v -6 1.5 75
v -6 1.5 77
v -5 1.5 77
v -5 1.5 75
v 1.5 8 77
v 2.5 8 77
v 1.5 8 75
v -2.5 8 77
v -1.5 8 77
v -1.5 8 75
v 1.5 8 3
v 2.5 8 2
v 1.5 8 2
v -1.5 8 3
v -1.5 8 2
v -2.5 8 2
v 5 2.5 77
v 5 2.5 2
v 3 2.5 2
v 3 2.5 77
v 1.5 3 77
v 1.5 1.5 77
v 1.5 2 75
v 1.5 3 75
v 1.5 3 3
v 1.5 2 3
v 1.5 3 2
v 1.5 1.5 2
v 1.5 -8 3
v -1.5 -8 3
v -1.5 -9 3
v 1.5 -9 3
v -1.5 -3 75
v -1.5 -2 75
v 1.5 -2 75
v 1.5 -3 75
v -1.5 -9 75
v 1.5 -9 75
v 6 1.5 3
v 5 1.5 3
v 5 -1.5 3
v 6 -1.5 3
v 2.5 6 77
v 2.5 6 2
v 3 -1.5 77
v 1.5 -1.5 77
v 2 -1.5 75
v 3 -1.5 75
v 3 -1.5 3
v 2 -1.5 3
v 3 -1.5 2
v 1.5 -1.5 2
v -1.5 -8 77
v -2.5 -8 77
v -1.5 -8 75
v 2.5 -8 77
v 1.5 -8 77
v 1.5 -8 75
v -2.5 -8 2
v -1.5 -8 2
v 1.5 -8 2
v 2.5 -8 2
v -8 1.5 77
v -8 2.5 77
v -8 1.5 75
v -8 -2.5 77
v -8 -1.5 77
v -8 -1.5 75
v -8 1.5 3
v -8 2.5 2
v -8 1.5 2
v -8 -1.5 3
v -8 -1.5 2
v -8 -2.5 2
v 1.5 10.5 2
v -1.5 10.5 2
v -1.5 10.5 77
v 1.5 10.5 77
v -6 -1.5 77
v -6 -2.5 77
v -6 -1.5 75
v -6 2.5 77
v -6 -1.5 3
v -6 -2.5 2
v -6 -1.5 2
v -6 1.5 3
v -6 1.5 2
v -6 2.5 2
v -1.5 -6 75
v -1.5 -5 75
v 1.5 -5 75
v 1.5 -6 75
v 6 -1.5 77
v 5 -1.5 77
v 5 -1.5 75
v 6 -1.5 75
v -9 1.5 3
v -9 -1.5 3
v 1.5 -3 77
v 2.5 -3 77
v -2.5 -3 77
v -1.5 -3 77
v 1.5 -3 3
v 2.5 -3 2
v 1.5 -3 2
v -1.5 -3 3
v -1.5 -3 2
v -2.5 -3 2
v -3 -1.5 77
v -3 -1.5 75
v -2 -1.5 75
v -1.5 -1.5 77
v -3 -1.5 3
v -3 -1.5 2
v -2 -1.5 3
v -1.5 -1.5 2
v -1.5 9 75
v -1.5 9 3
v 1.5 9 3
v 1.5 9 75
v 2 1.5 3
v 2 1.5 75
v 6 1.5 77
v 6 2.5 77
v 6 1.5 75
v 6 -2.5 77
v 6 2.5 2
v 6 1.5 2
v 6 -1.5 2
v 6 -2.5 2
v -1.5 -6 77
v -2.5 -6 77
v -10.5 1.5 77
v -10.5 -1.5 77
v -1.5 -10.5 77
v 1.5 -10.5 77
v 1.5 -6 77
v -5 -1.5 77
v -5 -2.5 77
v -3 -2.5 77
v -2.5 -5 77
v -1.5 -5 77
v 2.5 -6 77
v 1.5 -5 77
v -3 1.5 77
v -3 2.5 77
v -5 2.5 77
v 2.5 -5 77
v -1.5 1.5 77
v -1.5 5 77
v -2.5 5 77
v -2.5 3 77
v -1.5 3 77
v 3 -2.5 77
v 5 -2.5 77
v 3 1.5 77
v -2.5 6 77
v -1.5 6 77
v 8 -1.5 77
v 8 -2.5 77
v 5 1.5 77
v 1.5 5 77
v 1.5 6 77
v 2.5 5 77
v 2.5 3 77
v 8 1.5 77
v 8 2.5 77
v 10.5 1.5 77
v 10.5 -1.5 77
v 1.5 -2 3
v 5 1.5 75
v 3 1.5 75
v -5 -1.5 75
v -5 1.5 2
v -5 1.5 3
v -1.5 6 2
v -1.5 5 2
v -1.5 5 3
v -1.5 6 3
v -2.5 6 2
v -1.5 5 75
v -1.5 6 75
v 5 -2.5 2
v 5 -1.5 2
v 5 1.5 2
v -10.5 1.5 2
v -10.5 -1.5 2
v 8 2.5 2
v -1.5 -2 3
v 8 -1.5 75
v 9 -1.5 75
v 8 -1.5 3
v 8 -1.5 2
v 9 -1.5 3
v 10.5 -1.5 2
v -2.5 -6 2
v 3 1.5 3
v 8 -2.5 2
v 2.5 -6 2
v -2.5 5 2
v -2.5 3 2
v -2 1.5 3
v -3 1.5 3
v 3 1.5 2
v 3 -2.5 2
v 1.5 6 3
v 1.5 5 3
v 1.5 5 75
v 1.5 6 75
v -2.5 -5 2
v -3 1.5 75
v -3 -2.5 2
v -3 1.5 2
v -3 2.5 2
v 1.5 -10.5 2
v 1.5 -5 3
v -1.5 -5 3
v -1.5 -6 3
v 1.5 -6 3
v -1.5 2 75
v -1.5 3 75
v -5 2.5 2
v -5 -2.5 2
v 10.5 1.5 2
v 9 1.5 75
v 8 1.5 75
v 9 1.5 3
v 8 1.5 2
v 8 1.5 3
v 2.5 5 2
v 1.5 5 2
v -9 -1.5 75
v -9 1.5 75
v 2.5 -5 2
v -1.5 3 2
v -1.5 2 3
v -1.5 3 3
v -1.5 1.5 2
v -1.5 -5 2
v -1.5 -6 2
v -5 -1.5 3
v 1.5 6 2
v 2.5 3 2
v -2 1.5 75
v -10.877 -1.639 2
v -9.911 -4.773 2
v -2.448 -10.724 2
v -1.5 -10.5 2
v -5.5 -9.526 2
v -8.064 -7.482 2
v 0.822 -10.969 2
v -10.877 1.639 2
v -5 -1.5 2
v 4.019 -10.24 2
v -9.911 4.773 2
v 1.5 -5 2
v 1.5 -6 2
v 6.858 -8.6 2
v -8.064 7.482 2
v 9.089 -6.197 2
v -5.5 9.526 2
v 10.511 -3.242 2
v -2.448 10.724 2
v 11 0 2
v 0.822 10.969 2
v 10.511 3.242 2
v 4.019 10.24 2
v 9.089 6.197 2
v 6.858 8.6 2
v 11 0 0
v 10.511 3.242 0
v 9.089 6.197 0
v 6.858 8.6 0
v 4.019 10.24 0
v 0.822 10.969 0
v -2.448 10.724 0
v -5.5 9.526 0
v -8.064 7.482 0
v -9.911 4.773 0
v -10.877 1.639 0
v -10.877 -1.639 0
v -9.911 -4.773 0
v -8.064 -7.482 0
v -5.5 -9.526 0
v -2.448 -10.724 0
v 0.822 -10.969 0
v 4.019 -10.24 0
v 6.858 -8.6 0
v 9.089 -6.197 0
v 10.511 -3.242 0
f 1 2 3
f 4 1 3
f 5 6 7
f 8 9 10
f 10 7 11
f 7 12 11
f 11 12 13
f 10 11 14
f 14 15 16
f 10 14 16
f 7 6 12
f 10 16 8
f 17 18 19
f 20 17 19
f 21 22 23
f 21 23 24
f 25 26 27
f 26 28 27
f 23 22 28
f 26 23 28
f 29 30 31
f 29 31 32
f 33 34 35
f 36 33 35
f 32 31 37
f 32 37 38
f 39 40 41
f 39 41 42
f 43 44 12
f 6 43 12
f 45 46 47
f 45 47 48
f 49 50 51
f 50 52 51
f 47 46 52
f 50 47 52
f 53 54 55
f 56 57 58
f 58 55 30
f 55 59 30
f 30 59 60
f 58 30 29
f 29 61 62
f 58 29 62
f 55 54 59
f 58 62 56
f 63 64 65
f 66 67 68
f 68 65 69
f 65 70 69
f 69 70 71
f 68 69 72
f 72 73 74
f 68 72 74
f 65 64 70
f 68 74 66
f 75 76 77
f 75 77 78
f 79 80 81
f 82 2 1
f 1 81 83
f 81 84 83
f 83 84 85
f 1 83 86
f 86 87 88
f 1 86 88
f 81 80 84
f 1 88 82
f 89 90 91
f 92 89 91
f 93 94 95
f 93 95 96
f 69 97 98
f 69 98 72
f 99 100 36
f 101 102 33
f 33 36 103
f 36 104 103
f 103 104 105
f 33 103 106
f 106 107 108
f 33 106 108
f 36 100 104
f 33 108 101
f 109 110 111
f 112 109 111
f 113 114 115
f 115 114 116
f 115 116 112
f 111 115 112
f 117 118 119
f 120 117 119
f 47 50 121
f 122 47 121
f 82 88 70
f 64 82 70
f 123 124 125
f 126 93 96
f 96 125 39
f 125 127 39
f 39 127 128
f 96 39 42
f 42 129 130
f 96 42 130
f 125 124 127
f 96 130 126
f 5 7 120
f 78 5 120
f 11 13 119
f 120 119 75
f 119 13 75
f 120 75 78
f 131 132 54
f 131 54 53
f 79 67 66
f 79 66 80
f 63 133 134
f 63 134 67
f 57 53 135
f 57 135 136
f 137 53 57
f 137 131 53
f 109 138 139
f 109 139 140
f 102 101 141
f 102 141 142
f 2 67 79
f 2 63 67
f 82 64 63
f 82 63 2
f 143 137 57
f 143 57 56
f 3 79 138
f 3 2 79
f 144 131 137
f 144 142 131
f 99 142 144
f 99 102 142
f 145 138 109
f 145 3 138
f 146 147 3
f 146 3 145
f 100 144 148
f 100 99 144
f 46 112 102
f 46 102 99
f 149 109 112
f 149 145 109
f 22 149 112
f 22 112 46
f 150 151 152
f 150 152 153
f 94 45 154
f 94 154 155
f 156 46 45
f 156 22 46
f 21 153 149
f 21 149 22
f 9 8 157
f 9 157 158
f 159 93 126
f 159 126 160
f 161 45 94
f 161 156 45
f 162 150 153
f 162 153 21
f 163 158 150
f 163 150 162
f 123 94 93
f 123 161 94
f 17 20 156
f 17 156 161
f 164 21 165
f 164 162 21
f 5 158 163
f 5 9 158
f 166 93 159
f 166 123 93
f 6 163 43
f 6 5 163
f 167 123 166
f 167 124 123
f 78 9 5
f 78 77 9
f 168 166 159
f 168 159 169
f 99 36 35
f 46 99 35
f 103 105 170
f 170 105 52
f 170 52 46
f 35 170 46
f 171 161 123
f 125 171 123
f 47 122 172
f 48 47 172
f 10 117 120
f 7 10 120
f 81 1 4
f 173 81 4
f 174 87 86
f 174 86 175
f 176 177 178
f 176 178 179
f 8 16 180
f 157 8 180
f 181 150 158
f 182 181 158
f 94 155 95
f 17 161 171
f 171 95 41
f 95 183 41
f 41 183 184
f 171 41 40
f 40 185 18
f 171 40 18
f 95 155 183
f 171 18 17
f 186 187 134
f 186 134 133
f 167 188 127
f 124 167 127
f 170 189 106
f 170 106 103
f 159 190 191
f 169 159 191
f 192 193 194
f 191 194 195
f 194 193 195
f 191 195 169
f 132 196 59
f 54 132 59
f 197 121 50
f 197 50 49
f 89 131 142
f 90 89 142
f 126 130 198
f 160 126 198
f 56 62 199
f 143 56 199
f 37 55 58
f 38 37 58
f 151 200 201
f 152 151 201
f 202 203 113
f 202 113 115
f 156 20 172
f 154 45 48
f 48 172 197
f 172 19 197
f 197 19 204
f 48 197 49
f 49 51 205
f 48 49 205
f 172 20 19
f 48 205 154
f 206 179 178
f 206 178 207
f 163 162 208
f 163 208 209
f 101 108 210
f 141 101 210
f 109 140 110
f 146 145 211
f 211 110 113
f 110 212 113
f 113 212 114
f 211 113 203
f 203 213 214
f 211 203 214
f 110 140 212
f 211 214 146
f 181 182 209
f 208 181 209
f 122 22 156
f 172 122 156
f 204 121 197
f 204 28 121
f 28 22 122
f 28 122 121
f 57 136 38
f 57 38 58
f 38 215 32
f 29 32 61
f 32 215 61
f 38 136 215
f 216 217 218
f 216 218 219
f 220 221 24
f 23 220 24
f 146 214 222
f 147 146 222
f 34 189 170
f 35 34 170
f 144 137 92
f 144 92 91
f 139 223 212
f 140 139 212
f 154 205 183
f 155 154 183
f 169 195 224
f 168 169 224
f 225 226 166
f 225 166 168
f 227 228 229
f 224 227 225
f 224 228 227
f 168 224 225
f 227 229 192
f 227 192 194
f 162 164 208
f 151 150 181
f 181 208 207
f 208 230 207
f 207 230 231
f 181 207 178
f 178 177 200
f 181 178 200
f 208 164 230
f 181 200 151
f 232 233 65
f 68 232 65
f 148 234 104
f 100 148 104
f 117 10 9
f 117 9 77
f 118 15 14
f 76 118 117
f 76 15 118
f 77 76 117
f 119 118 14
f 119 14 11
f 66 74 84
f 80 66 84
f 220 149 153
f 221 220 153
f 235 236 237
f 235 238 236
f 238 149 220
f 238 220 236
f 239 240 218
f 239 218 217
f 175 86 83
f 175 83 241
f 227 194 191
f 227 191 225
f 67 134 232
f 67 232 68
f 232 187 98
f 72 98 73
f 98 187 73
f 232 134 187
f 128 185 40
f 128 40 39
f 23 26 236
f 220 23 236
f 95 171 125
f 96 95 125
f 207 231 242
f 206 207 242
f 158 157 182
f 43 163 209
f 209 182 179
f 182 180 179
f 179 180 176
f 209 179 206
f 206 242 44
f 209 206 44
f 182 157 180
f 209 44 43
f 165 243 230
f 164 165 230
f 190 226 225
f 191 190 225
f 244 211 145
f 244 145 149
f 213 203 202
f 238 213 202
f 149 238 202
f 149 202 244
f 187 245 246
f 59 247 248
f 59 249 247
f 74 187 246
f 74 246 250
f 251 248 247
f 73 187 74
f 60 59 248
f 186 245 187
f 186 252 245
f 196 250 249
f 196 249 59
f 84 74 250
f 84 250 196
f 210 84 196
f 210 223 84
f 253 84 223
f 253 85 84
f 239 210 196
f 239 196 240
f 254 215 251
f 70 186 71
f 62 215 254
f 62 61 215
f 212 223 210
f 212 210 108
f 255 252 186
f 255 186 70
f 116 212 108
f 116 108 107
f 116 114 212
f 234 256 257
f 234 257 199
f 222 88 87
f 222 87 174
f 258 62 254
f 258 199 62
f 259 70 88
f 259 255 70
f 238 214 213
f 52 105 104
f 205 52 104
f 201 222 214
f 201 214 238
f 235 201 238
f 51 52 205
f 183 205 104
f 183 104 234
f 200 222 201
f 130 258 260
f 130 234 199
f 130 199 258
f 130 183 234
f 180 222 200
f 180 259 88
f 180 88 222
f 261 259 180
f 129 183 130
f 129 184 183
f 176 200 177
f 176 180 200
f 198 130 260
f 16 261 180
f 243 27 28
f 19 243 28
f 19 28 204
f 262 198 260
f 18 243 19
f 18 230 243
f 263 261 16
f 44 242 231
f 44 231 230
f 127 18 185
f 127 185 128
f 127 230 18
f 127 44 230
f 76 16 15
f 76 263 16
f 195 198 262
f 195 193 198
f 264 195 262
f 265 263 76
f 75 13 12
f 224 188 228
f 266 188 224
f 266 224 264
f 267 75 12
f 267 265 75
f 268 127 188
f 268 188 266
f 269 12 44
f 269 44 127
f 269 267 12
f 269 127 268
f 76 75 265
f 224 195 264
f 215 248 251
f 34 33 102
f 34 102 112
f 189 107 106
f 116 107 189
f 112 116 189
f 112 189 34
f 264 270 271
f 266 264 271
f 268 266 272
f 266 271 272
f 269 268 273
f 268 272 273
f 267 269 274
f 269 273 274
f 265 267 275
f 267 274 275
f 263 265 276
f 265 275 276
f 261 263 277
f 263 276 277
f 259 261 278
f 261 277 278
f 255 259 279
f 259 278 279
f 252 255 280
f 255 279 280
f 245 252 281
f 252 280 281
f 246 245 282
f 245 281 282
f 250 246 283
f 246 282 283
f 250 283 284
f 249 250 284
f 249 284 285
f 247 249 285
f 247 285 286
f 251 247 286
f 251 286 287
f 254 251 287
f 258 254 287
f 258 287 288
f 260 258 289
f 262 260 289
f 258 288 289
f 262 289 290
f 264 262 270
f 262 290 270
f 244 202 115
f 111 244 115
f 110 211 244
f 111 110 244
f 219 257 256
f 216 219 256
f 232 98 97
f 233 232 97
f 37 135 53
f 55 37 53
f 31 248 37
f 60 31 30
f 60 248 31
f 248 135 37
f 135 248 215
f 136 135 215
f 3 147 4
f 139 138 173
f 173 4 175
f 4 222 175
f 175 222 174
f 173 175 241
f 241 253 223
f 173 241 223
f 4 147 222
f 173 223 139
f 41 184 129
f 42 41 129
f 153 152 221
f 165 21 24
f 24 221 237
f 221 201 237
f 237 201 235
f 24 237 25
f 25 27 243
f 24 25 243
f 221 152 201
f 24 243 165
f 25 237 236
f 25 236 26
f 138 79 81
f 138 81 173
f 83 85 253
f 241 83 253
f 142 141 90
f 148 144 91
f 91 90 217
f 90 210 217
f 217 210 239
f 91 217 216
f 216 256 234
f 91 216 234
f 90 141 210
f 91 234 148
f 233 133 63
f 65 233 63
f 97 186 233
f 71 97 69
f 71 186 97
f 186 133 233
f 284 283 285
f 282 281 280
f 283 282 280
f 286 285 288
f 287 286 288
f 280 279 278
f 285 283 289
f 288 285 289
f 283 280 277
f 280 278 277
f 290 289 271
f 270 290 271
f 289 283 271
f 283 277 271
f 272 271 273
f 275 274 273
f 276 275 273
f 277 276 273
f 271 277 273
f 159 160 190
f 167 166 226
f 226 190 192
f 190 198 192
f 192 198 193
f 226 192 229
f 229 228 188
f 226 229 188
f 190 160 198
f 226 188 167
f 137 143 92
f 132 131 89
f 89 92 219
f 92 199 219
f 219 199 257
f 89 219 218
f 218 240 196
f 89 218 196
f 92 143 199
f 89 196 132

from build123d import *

# Parameters (mm, degrees)
F0_R     = 11
F1_DEPTH = 2
F2_W     = 9
F2_H     = 3
F2_W_2   = 3
F2_H_2   = 9
F3_DEPTH = 1
F4_W     = 1.5
F4_H     = 3
F4_W_2   = 3
F4_H_2   = 1.5
F5_DEPTH = 75
F6_W     = 3
F6_H     = 9
F6_W_2   = 9
F6_H_2   = 3
F7_DEPTH = 2


with BuildPart() as f1:
    # F0 (on Top) → F1 (new body)
    with BuildSketch(Plane.XY):
        Circle(F0_R)
    extrude(amount=F1_DEPTH)

    # F2 (on face) → F3 (join)
    with BuildSketch(Plane.XY.offset(2)):
        with Locations((-6, 0)):
            Rectangle(F2_W, F2_H)
        with Locations((6, 0)):
            Rectangle(F2_W, F2_H)
        with Locations((0, 6)):
            Rectangle(F2_W_2, F2_H_2)
        with Locations((0, -6)):
            Rectangle(F2_W_2, F2_H_2)
    extrude(amount=F3_DEPTH)

    # F4 (on face) → F5 (join)
    with BuildSketch(Plane.XY.offset(2)):
        with Locations((9.75, 0)):
            Rectangle(F4_W, F4_H)
        Polygon((8, -1.5), (8, 1.5), (8, 2.5), (6, 2.5), (6, 1.5), (6, -1.5), (6, -2.5), (8, -2.5), align=None)
        Polygon((5, -1.5), (5, 1.5), (5, 2.5), (3, 2.5), (3, 1.5), (3, -1.5), (3, -2.5), (5, -2.5), align=None)
        Polygon((2, -1.5), (2, 1.5), (1.5, 1.5), (1.5, 2), (-1.5, 2), (-1.5, 1.5), (-2, 1.5), (-2, -1.5), (-1.5, -1.5), (-1.5, -2), (1.5, -2), (1.5, -1.5), align=None)
        Polygon((2.5, 6), (2.5, 8), (1.5, 8), (-1.5, 8), (-2.5, 8), (-2.5, 6), (-1.5, 6), (1.5, 6), align=None)
        Polygon((2.5, 3), (2.5, 5), (1.5, 5), (-1.5, 5), (-2.5, 5), (-2.5, 3), (-1.5, 3), (1.5, 3), align=None)
        with Locations((0, 9.75)):
            Rectangle(F4_W_2, F4_H_2)
        Polygon((-6, 2.5), (-8, 2.5), (-8, 1.5), (-8, -1.5), (-8, -2.5), (-6, -2.5), (-6, -1.5), (-6, 1.5), align=None)
        Polygon((-3, 2.5), (-5, 2.5), (-5, 1.5), (-5, -1.5), (-5, -2.5), (-3, -2.5), (-3, -1.5), (-3, 1.5), align=None)
        with Locations((-9.75, 0)):
            Rectangle(F4_W, F4_H)
        Polygon((-2.5, -6), (-2.5, -8), (-1.5, -8), (1.5, -8), (2.5, -8), (2.5, -6), (1.5, -6), (-1.5, -6), align=None)
        Polygon((-2.5, -3), (-2.5, -5), (-1.5, -5), (1.5, -5), (2.5, -5), (2.5, -3), (1.5, -3), (-1.5, -3), align=None)
        with Locations((0, -9.75)):
            Rectangle(F4_W_2, F4_H_2)
    extrude(amount=F5_DEPTH)

    # F6 (on face) → F7 (join)
    with BuildSketch(Plane.XY.offset(77)):
        with Locations((0, 6)):
            Rectangle(F6_W, F6_H)
        with Locations((-6, 0)):
            Rectangle(F6_W_2, F6_H_2)
        with Locations((0, -6)):
            Rectangle(F6_W, F6_H)
        with Locations((6, 0)):
            Rectangle(F6_W_2, F6_H_2)
    extrude(amount=-F7_DEPTH)


solid = f1.part
